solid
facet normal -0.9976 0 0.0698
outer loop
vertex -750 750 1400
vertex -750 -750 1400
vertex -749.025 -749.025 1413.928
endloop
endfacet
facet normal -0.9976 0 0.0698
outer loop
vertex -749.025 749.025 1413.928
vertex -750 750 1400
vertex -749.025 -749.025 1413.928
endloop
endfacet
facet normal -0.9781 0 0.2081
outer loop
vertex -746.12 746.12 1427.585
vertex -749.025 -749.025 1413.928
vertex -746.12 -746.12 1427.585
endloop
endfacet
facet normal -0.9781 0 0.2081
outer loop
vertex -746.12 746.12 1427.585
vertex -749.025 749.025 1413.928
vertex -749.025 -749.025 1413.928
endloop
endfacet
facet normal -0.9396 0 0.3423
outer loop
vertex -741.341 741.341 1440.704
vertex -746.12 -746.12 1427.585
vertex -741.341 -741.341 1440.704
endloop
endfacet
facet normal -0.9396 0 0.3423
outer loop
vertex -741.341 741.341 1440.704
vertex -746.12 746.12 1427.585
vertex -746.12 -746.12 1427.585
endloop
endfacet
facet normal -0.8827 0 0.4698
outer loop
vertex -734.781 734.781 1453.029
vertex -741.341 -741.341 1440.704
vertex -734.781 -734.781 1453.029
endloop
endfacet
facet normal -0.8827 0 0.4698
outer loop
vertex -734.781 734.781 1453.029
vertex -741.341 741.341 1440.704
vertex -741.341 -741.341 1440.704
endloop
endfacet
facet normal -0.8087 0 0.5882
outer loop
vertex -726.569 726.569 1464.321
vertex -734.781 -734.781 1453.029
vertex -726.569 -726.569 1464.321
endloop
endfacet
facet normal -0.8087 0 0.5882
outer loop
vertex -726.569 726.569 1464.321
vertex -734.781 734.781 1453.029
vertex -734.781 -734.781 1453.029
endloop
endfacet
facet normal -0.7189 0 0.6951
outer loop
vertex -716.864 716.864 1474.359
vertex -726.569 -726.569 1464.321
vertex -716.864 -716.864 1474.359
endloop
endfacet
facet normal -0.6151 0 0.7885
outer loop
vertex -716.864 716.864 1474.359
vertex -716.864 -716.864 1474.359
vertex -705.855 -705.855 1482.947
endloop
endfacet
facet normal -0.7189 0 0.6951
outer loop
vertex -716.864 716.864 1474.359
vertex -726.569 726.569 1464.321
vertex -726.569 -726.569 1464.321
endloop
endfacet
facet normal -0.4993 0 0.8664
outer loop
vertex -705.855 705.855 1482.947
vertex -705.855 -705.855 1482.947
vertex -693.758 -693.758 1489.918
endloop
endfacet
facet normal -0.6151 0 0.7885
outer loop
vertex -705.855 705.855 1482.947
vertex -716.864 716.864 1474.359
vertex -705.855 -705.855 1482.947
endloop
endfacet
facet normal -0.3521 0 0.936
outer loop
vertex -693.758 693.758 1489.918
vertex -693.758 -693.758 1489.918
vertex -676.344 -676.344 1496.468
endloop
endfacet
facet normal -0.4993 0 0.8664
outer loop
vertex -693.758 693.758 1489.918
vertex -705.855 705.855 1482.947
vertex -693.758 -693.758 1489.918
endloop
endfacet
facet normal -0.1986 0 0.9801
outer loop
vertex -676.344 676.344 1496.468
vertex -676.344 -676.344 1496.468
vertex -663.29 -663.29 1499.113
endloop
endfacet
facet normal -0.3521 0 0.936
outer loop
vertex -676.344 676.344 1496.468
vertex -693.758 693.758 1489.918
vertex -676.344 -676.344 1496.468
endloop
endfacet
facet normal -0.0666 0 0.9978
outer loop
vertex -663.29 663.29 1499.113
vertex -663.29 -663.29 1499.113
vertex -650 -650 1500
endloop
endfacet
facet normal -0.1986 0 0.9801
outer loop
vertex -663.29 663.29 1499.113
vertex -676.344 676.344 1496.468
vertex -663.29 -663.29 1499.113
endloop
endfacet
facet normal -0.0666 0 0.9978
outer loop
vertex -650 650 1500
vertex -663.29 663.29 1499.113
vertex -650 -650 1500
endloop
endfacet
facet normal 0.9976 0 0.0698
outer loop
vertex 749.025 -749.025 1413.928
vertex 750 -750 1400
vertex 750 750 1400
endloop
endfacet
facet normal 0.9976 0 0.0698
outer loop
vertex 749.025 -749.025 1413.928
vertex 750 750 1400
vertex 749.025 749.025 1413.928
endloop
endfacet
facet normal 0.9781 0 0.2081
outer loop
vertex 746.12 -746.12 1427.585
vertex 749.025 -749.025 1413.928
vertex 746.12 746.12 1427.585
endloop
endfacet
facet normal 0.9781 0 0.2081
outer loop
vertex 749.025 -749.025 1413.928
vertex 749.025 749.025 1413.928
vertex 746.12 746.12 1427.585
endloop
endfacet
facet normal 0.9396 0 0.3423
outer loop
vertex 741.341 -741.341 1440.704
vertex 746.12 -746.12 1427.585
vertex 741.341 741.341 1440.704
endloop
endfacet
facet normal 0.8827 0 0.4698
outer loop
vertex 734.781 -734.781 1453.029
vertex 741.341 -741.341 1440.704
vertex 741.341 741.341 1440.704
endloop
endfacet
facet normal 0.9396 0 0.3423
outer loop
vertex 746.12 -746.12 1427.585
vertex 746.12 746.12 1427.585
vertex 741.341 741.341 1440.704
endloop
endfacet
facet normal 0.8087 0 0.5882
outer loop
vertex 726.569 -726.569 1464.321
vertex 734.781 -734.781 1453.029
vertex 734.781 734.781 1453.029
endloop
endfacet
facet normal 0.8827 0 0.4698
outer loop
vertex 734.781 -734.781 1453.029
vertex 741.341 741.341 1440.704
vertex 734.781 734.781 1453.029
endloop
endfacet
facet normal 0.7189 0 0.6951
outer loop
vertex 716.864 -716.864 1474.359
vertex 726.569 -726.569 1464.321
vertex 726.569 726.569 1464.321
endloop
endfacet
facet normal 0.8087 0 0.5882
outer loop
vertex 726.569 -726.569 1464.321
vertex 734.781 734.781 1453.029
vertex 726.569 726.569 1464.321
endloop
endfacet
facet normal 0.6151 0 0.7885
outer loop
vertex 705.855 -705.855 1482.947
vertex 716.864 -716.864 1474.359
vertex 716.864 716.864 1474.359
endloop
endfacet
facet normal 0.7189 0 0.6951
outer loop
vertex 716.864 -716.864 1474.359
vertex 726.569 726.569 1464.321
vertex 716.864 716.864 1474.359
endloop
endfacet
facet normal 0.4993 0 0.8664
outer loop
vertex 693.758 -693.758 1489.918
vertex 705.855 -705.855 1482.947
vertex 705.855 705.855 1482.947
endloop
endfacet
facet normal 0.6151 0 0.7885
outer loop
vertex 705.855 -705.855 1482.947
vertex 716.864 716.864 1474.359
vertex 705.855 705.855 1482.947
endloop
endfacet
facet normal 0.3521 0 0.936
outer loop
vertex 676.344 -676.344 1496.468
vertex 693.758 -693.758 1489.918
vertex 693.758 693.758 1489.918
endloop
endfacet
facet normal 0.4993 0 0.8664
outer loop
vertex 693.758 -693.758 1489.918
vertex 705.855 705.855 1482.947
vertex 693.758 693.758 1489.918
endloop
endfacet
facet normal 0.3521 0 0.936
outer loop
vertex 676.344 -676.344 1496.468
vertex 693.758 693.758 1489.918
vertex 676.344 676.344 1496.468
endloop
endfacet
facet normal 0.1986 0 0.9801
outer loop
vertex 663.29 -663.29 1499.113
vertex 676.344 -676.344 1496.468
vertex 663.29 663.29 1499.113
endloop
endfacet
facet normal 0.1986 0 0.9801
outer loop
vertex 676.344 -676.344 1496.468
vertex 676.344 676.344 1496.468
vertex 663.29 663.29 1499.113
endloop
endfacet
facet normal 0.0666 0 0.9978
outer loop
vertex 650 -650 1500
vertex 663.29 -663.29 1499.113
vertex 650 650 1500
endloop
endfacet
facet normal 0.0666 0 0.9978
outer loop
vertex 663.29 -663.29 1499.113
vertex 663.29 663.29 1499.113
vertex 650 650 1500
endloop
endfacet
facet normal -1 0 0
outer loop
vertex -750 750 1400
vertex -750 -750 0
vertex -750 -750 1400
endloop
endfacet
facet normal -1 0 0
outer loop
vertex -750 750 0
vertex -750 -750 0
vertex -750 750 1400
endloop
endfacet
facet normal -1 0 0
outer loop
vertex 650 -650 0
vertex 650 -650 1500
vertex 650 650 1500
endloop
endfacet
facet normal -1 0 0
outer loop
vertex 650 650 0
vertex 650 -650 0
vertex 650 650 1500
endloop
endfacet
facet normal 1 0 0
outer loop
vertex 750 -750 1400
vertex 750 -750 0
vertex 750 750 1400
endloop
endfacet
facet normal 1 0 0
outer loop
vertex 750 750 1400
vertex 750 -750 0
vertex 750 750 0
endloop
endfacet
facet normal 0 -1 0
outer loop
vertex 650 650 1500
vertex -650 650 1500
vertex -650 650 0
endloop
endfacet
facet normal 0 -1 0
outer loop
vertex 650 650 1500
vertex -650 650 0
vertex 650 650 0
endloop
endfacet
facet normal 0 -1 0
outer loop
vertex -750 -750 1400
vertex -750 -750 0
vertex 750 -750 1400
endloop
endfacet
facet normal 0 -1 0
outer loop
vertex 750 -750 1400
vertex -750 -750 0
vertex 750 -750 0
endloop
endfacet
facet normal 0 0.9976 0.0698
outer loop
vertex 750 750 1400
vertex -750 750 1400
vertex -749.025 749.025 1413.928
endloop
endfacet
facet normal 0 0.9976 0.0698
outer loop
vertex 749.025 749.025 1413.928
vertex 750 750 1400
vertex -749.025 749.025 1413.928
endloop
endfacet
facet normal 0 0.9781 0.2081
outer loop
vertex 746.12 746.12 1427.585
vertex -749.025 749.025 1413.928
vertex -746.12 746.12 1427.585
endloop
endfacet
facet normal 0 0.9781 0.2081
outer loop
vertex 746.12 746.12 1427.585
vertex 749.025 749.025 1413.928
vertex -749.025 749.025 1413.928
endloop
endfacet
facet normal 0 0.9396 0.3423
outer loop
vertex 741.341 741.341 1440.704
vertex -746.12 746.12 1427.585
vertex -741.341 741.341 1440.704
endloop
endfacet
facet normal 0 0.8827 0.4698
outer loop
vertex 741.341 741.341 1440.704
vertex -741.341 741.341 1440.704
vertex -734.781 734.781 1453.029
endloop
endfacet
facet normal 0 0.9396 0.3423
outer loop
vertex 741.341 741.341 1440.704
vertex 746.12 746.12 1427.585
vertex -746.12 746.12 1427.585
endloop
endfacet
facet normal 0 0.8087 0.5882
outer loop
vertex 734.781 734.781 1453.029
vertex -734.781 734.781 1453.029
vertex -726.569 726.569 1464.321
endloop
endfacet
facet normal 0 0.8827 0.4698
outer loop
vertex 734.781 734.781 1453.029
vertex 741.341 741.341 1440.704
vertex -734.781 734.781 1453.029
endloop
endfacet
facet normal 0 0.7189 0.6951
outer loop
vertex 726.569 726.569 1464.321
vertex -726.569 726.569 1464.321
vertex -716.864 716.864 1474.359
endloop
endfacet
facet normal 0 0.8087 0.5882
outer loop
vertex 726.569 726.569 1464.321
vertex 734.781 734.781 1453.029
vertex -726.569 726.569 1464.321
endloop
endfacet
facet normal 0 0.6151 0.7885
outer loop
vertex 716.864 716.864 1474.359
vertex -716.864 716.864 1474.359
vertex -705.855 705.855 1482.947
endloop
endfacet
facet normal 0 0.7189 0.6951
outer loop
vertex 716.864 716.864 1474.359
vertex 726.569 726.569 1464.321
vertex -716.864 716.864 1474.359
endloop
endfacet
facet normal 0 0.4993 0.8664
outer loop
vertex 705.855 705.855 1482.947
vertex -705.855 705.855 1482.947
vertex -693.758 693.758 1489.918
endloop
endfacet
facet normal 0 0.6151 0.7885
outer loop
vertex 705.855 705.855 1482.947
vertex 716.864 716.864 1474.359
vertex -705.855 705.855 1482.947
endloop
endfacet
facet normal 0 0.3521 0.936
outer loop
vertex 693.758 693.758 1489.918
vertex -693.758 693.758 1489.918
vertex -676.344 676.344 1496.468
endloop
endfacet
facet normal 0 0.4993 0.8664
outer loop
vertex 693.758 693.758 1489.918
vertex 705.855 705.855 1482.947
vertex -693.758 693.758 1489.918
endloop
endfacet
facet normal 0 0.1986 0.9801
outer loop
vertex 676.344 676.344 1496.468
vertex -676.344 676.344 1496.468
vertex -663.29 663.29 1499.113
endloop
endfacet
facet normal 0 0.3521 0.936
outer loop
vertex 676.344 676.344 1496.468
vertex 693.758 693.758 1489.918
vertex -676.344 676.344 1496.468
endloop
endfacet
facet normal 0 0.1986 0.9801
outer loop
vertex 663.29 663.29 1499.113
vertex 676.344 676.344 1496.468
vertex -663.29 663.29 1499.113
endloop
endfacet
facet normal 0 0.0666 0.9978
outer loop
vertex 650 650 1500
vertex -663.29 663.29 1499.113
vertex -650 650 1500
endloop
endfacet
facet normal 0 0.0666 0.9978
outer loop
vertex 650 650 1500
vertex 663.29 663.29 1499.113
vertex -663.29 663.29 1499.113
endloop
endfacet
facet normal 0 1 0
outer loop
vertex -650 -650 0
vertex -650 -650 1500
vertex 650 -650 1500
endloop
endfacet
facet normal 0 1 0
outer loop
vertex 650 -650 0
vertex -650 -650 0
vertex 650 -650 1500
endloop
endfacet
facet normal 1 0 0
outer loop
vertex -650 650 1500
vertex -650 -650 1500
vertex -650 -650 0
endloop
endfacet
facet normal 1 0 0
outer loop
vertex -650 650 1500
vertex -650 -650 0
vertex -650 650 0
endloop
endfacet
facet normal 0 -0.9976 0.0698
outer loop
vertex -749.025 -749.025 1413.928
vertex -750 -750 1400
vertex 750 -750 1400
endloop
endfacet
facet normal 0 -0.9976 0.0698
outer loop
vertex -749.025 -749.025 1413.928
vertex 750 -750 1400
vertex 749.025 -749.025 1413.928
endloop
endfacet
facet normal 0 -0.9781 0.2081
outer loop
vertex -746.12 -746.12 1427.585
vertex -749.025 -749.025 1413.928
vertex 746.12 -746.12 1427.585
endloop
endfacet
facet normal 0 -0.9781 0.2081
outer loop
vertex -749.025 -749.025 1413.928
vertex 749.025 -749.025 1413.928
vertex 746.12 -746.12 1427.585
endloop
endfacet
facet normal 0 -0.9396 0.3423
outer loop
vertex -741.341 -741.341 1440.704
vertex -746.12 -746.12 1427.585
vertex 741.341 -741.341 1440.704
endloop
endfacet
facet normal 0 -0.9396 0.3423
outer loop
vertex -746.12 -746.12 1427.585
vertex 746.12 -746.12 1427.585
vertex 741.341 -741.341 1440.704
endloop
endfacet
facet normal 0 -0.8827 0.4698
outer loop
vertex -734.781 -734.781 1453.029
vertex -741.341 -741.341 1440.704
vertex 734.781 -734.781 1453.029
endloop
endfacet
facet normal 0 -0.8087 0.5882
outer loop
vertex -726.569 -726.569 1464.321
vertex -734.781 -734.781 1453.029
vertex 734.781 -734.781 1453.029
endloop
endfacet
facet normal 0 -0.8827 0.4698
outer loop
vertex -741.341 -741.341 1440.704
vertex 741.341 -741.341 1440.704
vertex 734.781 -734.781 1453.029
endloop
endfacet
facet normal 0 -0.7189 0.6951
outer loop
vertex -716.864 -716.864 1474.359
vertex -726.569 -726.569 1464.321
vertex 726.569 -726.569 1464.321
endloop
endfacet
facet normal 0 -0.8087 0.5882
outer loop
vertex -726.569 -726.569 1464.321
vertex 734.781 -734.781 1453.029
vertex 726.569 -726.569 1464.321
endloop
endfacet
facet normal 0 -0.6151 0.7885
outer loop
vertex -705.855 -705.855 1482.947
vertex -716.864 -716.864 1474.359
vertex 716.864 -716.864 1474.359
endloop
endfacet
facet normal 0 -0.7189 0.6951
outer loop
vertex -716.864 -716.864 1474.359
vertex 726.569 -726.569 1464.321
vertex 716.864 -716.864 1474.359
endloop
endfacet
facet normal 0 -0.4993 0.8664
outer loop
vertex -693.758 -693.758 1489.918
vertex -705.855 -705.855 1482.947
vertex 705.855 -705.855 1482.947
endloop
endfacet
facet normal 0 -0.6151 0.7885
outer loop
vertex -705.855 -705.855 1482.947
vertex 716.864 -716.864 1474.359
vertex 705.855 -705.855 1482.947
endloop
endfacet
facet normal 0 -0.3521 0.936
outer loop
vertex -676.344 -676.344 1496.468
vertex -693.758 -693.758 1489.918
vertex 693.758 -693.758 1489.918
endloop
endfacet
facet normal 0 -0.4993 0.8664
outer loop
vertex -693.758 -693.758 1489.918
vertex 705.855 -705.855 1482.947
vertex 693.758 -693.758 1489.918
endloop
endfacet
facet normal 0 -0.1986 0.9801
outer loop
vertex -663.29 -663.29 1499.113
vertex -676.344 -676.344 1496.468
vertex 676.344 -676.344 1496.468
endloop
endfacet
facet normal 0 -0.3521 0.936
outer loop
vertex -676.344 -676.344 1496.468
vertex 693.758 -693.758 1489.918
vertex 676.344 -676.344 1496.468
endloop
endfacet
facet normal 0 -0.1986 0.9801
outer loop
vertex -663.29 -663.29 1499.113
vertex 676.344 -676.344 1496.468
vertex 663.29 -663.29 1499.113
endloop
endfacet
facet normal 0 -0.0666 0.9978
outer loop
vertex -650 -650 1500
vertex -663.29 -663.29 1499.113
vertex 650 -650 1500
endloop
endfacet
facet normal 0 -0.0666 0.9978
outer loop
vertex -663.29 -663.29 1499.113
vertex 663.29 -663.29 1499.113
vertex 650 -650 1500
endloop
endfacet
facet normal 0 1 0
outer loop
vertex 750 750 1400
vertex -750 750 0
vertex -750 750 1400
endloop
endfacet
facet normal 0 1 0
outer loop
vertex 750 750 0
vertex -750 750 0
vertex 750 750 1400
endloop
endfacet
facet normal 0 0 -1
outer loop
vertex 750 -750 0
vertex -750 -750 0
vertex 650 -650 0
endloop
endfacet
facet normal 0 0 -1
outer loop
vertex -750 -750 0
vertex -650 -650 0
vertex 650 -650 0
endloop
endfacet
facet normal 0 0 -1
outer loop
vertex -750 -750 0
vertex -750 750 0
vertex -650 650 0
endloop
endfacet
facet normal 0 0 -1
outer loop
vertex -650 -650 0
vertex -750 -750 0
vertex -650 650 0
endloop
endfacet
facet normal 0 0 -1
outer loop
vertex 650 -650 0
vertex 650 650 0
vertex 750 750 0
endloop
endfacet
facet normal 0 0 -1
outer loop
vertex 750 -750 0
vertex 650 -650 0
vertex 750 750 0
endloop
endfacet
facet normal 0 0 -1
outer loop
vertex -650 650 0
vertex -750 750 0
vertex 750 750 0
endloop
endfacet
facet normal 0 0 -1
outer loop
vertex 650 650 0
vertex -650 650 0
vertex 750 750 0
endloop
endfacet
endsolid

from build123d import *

# Parameters (mm, degrees)
F2_W     = 1500
F2_H     = 1500
F0_DEPTH = 1500
F1_R     = 100
F3_W     = 1300
F3_H     = 1300
F3_W_2   = 284
F3_H_2   = 284
F4_DEPTH = 1500


with BuildPart() as f0:
    # F2 (on Top) → F0 (new body)
    with BuildSketch(Plane.XY):
        Rectangle(F2_W, F2_H)
    extrude(amount=F0_DEPTH)

    # F1
    f1_edges = [f0.edges().sort_by_distance(p)[0] for p in [
        (0, -750, 1500),
        (750, 0, 1500),
        (0, 750, 1500),
        (-750, 0, 1500),
    ]]
    fillet(f1_edges, radius=F1_R)

    # F3 (on face) → F4 (cut)
    with BuildSketch(Plane.XY.offset(1500)):
        Rectangle(F3_W, F3_H)
        Rectangle(F3_W_2, F3_H_2, mode=Mode.SUBTRACT)
        Rectangle(F3_W_2, F3_H_2)
    extrude(amount=-F4_DEPTH, mode=Mode.SUBTRACT)


solid = f0.part
